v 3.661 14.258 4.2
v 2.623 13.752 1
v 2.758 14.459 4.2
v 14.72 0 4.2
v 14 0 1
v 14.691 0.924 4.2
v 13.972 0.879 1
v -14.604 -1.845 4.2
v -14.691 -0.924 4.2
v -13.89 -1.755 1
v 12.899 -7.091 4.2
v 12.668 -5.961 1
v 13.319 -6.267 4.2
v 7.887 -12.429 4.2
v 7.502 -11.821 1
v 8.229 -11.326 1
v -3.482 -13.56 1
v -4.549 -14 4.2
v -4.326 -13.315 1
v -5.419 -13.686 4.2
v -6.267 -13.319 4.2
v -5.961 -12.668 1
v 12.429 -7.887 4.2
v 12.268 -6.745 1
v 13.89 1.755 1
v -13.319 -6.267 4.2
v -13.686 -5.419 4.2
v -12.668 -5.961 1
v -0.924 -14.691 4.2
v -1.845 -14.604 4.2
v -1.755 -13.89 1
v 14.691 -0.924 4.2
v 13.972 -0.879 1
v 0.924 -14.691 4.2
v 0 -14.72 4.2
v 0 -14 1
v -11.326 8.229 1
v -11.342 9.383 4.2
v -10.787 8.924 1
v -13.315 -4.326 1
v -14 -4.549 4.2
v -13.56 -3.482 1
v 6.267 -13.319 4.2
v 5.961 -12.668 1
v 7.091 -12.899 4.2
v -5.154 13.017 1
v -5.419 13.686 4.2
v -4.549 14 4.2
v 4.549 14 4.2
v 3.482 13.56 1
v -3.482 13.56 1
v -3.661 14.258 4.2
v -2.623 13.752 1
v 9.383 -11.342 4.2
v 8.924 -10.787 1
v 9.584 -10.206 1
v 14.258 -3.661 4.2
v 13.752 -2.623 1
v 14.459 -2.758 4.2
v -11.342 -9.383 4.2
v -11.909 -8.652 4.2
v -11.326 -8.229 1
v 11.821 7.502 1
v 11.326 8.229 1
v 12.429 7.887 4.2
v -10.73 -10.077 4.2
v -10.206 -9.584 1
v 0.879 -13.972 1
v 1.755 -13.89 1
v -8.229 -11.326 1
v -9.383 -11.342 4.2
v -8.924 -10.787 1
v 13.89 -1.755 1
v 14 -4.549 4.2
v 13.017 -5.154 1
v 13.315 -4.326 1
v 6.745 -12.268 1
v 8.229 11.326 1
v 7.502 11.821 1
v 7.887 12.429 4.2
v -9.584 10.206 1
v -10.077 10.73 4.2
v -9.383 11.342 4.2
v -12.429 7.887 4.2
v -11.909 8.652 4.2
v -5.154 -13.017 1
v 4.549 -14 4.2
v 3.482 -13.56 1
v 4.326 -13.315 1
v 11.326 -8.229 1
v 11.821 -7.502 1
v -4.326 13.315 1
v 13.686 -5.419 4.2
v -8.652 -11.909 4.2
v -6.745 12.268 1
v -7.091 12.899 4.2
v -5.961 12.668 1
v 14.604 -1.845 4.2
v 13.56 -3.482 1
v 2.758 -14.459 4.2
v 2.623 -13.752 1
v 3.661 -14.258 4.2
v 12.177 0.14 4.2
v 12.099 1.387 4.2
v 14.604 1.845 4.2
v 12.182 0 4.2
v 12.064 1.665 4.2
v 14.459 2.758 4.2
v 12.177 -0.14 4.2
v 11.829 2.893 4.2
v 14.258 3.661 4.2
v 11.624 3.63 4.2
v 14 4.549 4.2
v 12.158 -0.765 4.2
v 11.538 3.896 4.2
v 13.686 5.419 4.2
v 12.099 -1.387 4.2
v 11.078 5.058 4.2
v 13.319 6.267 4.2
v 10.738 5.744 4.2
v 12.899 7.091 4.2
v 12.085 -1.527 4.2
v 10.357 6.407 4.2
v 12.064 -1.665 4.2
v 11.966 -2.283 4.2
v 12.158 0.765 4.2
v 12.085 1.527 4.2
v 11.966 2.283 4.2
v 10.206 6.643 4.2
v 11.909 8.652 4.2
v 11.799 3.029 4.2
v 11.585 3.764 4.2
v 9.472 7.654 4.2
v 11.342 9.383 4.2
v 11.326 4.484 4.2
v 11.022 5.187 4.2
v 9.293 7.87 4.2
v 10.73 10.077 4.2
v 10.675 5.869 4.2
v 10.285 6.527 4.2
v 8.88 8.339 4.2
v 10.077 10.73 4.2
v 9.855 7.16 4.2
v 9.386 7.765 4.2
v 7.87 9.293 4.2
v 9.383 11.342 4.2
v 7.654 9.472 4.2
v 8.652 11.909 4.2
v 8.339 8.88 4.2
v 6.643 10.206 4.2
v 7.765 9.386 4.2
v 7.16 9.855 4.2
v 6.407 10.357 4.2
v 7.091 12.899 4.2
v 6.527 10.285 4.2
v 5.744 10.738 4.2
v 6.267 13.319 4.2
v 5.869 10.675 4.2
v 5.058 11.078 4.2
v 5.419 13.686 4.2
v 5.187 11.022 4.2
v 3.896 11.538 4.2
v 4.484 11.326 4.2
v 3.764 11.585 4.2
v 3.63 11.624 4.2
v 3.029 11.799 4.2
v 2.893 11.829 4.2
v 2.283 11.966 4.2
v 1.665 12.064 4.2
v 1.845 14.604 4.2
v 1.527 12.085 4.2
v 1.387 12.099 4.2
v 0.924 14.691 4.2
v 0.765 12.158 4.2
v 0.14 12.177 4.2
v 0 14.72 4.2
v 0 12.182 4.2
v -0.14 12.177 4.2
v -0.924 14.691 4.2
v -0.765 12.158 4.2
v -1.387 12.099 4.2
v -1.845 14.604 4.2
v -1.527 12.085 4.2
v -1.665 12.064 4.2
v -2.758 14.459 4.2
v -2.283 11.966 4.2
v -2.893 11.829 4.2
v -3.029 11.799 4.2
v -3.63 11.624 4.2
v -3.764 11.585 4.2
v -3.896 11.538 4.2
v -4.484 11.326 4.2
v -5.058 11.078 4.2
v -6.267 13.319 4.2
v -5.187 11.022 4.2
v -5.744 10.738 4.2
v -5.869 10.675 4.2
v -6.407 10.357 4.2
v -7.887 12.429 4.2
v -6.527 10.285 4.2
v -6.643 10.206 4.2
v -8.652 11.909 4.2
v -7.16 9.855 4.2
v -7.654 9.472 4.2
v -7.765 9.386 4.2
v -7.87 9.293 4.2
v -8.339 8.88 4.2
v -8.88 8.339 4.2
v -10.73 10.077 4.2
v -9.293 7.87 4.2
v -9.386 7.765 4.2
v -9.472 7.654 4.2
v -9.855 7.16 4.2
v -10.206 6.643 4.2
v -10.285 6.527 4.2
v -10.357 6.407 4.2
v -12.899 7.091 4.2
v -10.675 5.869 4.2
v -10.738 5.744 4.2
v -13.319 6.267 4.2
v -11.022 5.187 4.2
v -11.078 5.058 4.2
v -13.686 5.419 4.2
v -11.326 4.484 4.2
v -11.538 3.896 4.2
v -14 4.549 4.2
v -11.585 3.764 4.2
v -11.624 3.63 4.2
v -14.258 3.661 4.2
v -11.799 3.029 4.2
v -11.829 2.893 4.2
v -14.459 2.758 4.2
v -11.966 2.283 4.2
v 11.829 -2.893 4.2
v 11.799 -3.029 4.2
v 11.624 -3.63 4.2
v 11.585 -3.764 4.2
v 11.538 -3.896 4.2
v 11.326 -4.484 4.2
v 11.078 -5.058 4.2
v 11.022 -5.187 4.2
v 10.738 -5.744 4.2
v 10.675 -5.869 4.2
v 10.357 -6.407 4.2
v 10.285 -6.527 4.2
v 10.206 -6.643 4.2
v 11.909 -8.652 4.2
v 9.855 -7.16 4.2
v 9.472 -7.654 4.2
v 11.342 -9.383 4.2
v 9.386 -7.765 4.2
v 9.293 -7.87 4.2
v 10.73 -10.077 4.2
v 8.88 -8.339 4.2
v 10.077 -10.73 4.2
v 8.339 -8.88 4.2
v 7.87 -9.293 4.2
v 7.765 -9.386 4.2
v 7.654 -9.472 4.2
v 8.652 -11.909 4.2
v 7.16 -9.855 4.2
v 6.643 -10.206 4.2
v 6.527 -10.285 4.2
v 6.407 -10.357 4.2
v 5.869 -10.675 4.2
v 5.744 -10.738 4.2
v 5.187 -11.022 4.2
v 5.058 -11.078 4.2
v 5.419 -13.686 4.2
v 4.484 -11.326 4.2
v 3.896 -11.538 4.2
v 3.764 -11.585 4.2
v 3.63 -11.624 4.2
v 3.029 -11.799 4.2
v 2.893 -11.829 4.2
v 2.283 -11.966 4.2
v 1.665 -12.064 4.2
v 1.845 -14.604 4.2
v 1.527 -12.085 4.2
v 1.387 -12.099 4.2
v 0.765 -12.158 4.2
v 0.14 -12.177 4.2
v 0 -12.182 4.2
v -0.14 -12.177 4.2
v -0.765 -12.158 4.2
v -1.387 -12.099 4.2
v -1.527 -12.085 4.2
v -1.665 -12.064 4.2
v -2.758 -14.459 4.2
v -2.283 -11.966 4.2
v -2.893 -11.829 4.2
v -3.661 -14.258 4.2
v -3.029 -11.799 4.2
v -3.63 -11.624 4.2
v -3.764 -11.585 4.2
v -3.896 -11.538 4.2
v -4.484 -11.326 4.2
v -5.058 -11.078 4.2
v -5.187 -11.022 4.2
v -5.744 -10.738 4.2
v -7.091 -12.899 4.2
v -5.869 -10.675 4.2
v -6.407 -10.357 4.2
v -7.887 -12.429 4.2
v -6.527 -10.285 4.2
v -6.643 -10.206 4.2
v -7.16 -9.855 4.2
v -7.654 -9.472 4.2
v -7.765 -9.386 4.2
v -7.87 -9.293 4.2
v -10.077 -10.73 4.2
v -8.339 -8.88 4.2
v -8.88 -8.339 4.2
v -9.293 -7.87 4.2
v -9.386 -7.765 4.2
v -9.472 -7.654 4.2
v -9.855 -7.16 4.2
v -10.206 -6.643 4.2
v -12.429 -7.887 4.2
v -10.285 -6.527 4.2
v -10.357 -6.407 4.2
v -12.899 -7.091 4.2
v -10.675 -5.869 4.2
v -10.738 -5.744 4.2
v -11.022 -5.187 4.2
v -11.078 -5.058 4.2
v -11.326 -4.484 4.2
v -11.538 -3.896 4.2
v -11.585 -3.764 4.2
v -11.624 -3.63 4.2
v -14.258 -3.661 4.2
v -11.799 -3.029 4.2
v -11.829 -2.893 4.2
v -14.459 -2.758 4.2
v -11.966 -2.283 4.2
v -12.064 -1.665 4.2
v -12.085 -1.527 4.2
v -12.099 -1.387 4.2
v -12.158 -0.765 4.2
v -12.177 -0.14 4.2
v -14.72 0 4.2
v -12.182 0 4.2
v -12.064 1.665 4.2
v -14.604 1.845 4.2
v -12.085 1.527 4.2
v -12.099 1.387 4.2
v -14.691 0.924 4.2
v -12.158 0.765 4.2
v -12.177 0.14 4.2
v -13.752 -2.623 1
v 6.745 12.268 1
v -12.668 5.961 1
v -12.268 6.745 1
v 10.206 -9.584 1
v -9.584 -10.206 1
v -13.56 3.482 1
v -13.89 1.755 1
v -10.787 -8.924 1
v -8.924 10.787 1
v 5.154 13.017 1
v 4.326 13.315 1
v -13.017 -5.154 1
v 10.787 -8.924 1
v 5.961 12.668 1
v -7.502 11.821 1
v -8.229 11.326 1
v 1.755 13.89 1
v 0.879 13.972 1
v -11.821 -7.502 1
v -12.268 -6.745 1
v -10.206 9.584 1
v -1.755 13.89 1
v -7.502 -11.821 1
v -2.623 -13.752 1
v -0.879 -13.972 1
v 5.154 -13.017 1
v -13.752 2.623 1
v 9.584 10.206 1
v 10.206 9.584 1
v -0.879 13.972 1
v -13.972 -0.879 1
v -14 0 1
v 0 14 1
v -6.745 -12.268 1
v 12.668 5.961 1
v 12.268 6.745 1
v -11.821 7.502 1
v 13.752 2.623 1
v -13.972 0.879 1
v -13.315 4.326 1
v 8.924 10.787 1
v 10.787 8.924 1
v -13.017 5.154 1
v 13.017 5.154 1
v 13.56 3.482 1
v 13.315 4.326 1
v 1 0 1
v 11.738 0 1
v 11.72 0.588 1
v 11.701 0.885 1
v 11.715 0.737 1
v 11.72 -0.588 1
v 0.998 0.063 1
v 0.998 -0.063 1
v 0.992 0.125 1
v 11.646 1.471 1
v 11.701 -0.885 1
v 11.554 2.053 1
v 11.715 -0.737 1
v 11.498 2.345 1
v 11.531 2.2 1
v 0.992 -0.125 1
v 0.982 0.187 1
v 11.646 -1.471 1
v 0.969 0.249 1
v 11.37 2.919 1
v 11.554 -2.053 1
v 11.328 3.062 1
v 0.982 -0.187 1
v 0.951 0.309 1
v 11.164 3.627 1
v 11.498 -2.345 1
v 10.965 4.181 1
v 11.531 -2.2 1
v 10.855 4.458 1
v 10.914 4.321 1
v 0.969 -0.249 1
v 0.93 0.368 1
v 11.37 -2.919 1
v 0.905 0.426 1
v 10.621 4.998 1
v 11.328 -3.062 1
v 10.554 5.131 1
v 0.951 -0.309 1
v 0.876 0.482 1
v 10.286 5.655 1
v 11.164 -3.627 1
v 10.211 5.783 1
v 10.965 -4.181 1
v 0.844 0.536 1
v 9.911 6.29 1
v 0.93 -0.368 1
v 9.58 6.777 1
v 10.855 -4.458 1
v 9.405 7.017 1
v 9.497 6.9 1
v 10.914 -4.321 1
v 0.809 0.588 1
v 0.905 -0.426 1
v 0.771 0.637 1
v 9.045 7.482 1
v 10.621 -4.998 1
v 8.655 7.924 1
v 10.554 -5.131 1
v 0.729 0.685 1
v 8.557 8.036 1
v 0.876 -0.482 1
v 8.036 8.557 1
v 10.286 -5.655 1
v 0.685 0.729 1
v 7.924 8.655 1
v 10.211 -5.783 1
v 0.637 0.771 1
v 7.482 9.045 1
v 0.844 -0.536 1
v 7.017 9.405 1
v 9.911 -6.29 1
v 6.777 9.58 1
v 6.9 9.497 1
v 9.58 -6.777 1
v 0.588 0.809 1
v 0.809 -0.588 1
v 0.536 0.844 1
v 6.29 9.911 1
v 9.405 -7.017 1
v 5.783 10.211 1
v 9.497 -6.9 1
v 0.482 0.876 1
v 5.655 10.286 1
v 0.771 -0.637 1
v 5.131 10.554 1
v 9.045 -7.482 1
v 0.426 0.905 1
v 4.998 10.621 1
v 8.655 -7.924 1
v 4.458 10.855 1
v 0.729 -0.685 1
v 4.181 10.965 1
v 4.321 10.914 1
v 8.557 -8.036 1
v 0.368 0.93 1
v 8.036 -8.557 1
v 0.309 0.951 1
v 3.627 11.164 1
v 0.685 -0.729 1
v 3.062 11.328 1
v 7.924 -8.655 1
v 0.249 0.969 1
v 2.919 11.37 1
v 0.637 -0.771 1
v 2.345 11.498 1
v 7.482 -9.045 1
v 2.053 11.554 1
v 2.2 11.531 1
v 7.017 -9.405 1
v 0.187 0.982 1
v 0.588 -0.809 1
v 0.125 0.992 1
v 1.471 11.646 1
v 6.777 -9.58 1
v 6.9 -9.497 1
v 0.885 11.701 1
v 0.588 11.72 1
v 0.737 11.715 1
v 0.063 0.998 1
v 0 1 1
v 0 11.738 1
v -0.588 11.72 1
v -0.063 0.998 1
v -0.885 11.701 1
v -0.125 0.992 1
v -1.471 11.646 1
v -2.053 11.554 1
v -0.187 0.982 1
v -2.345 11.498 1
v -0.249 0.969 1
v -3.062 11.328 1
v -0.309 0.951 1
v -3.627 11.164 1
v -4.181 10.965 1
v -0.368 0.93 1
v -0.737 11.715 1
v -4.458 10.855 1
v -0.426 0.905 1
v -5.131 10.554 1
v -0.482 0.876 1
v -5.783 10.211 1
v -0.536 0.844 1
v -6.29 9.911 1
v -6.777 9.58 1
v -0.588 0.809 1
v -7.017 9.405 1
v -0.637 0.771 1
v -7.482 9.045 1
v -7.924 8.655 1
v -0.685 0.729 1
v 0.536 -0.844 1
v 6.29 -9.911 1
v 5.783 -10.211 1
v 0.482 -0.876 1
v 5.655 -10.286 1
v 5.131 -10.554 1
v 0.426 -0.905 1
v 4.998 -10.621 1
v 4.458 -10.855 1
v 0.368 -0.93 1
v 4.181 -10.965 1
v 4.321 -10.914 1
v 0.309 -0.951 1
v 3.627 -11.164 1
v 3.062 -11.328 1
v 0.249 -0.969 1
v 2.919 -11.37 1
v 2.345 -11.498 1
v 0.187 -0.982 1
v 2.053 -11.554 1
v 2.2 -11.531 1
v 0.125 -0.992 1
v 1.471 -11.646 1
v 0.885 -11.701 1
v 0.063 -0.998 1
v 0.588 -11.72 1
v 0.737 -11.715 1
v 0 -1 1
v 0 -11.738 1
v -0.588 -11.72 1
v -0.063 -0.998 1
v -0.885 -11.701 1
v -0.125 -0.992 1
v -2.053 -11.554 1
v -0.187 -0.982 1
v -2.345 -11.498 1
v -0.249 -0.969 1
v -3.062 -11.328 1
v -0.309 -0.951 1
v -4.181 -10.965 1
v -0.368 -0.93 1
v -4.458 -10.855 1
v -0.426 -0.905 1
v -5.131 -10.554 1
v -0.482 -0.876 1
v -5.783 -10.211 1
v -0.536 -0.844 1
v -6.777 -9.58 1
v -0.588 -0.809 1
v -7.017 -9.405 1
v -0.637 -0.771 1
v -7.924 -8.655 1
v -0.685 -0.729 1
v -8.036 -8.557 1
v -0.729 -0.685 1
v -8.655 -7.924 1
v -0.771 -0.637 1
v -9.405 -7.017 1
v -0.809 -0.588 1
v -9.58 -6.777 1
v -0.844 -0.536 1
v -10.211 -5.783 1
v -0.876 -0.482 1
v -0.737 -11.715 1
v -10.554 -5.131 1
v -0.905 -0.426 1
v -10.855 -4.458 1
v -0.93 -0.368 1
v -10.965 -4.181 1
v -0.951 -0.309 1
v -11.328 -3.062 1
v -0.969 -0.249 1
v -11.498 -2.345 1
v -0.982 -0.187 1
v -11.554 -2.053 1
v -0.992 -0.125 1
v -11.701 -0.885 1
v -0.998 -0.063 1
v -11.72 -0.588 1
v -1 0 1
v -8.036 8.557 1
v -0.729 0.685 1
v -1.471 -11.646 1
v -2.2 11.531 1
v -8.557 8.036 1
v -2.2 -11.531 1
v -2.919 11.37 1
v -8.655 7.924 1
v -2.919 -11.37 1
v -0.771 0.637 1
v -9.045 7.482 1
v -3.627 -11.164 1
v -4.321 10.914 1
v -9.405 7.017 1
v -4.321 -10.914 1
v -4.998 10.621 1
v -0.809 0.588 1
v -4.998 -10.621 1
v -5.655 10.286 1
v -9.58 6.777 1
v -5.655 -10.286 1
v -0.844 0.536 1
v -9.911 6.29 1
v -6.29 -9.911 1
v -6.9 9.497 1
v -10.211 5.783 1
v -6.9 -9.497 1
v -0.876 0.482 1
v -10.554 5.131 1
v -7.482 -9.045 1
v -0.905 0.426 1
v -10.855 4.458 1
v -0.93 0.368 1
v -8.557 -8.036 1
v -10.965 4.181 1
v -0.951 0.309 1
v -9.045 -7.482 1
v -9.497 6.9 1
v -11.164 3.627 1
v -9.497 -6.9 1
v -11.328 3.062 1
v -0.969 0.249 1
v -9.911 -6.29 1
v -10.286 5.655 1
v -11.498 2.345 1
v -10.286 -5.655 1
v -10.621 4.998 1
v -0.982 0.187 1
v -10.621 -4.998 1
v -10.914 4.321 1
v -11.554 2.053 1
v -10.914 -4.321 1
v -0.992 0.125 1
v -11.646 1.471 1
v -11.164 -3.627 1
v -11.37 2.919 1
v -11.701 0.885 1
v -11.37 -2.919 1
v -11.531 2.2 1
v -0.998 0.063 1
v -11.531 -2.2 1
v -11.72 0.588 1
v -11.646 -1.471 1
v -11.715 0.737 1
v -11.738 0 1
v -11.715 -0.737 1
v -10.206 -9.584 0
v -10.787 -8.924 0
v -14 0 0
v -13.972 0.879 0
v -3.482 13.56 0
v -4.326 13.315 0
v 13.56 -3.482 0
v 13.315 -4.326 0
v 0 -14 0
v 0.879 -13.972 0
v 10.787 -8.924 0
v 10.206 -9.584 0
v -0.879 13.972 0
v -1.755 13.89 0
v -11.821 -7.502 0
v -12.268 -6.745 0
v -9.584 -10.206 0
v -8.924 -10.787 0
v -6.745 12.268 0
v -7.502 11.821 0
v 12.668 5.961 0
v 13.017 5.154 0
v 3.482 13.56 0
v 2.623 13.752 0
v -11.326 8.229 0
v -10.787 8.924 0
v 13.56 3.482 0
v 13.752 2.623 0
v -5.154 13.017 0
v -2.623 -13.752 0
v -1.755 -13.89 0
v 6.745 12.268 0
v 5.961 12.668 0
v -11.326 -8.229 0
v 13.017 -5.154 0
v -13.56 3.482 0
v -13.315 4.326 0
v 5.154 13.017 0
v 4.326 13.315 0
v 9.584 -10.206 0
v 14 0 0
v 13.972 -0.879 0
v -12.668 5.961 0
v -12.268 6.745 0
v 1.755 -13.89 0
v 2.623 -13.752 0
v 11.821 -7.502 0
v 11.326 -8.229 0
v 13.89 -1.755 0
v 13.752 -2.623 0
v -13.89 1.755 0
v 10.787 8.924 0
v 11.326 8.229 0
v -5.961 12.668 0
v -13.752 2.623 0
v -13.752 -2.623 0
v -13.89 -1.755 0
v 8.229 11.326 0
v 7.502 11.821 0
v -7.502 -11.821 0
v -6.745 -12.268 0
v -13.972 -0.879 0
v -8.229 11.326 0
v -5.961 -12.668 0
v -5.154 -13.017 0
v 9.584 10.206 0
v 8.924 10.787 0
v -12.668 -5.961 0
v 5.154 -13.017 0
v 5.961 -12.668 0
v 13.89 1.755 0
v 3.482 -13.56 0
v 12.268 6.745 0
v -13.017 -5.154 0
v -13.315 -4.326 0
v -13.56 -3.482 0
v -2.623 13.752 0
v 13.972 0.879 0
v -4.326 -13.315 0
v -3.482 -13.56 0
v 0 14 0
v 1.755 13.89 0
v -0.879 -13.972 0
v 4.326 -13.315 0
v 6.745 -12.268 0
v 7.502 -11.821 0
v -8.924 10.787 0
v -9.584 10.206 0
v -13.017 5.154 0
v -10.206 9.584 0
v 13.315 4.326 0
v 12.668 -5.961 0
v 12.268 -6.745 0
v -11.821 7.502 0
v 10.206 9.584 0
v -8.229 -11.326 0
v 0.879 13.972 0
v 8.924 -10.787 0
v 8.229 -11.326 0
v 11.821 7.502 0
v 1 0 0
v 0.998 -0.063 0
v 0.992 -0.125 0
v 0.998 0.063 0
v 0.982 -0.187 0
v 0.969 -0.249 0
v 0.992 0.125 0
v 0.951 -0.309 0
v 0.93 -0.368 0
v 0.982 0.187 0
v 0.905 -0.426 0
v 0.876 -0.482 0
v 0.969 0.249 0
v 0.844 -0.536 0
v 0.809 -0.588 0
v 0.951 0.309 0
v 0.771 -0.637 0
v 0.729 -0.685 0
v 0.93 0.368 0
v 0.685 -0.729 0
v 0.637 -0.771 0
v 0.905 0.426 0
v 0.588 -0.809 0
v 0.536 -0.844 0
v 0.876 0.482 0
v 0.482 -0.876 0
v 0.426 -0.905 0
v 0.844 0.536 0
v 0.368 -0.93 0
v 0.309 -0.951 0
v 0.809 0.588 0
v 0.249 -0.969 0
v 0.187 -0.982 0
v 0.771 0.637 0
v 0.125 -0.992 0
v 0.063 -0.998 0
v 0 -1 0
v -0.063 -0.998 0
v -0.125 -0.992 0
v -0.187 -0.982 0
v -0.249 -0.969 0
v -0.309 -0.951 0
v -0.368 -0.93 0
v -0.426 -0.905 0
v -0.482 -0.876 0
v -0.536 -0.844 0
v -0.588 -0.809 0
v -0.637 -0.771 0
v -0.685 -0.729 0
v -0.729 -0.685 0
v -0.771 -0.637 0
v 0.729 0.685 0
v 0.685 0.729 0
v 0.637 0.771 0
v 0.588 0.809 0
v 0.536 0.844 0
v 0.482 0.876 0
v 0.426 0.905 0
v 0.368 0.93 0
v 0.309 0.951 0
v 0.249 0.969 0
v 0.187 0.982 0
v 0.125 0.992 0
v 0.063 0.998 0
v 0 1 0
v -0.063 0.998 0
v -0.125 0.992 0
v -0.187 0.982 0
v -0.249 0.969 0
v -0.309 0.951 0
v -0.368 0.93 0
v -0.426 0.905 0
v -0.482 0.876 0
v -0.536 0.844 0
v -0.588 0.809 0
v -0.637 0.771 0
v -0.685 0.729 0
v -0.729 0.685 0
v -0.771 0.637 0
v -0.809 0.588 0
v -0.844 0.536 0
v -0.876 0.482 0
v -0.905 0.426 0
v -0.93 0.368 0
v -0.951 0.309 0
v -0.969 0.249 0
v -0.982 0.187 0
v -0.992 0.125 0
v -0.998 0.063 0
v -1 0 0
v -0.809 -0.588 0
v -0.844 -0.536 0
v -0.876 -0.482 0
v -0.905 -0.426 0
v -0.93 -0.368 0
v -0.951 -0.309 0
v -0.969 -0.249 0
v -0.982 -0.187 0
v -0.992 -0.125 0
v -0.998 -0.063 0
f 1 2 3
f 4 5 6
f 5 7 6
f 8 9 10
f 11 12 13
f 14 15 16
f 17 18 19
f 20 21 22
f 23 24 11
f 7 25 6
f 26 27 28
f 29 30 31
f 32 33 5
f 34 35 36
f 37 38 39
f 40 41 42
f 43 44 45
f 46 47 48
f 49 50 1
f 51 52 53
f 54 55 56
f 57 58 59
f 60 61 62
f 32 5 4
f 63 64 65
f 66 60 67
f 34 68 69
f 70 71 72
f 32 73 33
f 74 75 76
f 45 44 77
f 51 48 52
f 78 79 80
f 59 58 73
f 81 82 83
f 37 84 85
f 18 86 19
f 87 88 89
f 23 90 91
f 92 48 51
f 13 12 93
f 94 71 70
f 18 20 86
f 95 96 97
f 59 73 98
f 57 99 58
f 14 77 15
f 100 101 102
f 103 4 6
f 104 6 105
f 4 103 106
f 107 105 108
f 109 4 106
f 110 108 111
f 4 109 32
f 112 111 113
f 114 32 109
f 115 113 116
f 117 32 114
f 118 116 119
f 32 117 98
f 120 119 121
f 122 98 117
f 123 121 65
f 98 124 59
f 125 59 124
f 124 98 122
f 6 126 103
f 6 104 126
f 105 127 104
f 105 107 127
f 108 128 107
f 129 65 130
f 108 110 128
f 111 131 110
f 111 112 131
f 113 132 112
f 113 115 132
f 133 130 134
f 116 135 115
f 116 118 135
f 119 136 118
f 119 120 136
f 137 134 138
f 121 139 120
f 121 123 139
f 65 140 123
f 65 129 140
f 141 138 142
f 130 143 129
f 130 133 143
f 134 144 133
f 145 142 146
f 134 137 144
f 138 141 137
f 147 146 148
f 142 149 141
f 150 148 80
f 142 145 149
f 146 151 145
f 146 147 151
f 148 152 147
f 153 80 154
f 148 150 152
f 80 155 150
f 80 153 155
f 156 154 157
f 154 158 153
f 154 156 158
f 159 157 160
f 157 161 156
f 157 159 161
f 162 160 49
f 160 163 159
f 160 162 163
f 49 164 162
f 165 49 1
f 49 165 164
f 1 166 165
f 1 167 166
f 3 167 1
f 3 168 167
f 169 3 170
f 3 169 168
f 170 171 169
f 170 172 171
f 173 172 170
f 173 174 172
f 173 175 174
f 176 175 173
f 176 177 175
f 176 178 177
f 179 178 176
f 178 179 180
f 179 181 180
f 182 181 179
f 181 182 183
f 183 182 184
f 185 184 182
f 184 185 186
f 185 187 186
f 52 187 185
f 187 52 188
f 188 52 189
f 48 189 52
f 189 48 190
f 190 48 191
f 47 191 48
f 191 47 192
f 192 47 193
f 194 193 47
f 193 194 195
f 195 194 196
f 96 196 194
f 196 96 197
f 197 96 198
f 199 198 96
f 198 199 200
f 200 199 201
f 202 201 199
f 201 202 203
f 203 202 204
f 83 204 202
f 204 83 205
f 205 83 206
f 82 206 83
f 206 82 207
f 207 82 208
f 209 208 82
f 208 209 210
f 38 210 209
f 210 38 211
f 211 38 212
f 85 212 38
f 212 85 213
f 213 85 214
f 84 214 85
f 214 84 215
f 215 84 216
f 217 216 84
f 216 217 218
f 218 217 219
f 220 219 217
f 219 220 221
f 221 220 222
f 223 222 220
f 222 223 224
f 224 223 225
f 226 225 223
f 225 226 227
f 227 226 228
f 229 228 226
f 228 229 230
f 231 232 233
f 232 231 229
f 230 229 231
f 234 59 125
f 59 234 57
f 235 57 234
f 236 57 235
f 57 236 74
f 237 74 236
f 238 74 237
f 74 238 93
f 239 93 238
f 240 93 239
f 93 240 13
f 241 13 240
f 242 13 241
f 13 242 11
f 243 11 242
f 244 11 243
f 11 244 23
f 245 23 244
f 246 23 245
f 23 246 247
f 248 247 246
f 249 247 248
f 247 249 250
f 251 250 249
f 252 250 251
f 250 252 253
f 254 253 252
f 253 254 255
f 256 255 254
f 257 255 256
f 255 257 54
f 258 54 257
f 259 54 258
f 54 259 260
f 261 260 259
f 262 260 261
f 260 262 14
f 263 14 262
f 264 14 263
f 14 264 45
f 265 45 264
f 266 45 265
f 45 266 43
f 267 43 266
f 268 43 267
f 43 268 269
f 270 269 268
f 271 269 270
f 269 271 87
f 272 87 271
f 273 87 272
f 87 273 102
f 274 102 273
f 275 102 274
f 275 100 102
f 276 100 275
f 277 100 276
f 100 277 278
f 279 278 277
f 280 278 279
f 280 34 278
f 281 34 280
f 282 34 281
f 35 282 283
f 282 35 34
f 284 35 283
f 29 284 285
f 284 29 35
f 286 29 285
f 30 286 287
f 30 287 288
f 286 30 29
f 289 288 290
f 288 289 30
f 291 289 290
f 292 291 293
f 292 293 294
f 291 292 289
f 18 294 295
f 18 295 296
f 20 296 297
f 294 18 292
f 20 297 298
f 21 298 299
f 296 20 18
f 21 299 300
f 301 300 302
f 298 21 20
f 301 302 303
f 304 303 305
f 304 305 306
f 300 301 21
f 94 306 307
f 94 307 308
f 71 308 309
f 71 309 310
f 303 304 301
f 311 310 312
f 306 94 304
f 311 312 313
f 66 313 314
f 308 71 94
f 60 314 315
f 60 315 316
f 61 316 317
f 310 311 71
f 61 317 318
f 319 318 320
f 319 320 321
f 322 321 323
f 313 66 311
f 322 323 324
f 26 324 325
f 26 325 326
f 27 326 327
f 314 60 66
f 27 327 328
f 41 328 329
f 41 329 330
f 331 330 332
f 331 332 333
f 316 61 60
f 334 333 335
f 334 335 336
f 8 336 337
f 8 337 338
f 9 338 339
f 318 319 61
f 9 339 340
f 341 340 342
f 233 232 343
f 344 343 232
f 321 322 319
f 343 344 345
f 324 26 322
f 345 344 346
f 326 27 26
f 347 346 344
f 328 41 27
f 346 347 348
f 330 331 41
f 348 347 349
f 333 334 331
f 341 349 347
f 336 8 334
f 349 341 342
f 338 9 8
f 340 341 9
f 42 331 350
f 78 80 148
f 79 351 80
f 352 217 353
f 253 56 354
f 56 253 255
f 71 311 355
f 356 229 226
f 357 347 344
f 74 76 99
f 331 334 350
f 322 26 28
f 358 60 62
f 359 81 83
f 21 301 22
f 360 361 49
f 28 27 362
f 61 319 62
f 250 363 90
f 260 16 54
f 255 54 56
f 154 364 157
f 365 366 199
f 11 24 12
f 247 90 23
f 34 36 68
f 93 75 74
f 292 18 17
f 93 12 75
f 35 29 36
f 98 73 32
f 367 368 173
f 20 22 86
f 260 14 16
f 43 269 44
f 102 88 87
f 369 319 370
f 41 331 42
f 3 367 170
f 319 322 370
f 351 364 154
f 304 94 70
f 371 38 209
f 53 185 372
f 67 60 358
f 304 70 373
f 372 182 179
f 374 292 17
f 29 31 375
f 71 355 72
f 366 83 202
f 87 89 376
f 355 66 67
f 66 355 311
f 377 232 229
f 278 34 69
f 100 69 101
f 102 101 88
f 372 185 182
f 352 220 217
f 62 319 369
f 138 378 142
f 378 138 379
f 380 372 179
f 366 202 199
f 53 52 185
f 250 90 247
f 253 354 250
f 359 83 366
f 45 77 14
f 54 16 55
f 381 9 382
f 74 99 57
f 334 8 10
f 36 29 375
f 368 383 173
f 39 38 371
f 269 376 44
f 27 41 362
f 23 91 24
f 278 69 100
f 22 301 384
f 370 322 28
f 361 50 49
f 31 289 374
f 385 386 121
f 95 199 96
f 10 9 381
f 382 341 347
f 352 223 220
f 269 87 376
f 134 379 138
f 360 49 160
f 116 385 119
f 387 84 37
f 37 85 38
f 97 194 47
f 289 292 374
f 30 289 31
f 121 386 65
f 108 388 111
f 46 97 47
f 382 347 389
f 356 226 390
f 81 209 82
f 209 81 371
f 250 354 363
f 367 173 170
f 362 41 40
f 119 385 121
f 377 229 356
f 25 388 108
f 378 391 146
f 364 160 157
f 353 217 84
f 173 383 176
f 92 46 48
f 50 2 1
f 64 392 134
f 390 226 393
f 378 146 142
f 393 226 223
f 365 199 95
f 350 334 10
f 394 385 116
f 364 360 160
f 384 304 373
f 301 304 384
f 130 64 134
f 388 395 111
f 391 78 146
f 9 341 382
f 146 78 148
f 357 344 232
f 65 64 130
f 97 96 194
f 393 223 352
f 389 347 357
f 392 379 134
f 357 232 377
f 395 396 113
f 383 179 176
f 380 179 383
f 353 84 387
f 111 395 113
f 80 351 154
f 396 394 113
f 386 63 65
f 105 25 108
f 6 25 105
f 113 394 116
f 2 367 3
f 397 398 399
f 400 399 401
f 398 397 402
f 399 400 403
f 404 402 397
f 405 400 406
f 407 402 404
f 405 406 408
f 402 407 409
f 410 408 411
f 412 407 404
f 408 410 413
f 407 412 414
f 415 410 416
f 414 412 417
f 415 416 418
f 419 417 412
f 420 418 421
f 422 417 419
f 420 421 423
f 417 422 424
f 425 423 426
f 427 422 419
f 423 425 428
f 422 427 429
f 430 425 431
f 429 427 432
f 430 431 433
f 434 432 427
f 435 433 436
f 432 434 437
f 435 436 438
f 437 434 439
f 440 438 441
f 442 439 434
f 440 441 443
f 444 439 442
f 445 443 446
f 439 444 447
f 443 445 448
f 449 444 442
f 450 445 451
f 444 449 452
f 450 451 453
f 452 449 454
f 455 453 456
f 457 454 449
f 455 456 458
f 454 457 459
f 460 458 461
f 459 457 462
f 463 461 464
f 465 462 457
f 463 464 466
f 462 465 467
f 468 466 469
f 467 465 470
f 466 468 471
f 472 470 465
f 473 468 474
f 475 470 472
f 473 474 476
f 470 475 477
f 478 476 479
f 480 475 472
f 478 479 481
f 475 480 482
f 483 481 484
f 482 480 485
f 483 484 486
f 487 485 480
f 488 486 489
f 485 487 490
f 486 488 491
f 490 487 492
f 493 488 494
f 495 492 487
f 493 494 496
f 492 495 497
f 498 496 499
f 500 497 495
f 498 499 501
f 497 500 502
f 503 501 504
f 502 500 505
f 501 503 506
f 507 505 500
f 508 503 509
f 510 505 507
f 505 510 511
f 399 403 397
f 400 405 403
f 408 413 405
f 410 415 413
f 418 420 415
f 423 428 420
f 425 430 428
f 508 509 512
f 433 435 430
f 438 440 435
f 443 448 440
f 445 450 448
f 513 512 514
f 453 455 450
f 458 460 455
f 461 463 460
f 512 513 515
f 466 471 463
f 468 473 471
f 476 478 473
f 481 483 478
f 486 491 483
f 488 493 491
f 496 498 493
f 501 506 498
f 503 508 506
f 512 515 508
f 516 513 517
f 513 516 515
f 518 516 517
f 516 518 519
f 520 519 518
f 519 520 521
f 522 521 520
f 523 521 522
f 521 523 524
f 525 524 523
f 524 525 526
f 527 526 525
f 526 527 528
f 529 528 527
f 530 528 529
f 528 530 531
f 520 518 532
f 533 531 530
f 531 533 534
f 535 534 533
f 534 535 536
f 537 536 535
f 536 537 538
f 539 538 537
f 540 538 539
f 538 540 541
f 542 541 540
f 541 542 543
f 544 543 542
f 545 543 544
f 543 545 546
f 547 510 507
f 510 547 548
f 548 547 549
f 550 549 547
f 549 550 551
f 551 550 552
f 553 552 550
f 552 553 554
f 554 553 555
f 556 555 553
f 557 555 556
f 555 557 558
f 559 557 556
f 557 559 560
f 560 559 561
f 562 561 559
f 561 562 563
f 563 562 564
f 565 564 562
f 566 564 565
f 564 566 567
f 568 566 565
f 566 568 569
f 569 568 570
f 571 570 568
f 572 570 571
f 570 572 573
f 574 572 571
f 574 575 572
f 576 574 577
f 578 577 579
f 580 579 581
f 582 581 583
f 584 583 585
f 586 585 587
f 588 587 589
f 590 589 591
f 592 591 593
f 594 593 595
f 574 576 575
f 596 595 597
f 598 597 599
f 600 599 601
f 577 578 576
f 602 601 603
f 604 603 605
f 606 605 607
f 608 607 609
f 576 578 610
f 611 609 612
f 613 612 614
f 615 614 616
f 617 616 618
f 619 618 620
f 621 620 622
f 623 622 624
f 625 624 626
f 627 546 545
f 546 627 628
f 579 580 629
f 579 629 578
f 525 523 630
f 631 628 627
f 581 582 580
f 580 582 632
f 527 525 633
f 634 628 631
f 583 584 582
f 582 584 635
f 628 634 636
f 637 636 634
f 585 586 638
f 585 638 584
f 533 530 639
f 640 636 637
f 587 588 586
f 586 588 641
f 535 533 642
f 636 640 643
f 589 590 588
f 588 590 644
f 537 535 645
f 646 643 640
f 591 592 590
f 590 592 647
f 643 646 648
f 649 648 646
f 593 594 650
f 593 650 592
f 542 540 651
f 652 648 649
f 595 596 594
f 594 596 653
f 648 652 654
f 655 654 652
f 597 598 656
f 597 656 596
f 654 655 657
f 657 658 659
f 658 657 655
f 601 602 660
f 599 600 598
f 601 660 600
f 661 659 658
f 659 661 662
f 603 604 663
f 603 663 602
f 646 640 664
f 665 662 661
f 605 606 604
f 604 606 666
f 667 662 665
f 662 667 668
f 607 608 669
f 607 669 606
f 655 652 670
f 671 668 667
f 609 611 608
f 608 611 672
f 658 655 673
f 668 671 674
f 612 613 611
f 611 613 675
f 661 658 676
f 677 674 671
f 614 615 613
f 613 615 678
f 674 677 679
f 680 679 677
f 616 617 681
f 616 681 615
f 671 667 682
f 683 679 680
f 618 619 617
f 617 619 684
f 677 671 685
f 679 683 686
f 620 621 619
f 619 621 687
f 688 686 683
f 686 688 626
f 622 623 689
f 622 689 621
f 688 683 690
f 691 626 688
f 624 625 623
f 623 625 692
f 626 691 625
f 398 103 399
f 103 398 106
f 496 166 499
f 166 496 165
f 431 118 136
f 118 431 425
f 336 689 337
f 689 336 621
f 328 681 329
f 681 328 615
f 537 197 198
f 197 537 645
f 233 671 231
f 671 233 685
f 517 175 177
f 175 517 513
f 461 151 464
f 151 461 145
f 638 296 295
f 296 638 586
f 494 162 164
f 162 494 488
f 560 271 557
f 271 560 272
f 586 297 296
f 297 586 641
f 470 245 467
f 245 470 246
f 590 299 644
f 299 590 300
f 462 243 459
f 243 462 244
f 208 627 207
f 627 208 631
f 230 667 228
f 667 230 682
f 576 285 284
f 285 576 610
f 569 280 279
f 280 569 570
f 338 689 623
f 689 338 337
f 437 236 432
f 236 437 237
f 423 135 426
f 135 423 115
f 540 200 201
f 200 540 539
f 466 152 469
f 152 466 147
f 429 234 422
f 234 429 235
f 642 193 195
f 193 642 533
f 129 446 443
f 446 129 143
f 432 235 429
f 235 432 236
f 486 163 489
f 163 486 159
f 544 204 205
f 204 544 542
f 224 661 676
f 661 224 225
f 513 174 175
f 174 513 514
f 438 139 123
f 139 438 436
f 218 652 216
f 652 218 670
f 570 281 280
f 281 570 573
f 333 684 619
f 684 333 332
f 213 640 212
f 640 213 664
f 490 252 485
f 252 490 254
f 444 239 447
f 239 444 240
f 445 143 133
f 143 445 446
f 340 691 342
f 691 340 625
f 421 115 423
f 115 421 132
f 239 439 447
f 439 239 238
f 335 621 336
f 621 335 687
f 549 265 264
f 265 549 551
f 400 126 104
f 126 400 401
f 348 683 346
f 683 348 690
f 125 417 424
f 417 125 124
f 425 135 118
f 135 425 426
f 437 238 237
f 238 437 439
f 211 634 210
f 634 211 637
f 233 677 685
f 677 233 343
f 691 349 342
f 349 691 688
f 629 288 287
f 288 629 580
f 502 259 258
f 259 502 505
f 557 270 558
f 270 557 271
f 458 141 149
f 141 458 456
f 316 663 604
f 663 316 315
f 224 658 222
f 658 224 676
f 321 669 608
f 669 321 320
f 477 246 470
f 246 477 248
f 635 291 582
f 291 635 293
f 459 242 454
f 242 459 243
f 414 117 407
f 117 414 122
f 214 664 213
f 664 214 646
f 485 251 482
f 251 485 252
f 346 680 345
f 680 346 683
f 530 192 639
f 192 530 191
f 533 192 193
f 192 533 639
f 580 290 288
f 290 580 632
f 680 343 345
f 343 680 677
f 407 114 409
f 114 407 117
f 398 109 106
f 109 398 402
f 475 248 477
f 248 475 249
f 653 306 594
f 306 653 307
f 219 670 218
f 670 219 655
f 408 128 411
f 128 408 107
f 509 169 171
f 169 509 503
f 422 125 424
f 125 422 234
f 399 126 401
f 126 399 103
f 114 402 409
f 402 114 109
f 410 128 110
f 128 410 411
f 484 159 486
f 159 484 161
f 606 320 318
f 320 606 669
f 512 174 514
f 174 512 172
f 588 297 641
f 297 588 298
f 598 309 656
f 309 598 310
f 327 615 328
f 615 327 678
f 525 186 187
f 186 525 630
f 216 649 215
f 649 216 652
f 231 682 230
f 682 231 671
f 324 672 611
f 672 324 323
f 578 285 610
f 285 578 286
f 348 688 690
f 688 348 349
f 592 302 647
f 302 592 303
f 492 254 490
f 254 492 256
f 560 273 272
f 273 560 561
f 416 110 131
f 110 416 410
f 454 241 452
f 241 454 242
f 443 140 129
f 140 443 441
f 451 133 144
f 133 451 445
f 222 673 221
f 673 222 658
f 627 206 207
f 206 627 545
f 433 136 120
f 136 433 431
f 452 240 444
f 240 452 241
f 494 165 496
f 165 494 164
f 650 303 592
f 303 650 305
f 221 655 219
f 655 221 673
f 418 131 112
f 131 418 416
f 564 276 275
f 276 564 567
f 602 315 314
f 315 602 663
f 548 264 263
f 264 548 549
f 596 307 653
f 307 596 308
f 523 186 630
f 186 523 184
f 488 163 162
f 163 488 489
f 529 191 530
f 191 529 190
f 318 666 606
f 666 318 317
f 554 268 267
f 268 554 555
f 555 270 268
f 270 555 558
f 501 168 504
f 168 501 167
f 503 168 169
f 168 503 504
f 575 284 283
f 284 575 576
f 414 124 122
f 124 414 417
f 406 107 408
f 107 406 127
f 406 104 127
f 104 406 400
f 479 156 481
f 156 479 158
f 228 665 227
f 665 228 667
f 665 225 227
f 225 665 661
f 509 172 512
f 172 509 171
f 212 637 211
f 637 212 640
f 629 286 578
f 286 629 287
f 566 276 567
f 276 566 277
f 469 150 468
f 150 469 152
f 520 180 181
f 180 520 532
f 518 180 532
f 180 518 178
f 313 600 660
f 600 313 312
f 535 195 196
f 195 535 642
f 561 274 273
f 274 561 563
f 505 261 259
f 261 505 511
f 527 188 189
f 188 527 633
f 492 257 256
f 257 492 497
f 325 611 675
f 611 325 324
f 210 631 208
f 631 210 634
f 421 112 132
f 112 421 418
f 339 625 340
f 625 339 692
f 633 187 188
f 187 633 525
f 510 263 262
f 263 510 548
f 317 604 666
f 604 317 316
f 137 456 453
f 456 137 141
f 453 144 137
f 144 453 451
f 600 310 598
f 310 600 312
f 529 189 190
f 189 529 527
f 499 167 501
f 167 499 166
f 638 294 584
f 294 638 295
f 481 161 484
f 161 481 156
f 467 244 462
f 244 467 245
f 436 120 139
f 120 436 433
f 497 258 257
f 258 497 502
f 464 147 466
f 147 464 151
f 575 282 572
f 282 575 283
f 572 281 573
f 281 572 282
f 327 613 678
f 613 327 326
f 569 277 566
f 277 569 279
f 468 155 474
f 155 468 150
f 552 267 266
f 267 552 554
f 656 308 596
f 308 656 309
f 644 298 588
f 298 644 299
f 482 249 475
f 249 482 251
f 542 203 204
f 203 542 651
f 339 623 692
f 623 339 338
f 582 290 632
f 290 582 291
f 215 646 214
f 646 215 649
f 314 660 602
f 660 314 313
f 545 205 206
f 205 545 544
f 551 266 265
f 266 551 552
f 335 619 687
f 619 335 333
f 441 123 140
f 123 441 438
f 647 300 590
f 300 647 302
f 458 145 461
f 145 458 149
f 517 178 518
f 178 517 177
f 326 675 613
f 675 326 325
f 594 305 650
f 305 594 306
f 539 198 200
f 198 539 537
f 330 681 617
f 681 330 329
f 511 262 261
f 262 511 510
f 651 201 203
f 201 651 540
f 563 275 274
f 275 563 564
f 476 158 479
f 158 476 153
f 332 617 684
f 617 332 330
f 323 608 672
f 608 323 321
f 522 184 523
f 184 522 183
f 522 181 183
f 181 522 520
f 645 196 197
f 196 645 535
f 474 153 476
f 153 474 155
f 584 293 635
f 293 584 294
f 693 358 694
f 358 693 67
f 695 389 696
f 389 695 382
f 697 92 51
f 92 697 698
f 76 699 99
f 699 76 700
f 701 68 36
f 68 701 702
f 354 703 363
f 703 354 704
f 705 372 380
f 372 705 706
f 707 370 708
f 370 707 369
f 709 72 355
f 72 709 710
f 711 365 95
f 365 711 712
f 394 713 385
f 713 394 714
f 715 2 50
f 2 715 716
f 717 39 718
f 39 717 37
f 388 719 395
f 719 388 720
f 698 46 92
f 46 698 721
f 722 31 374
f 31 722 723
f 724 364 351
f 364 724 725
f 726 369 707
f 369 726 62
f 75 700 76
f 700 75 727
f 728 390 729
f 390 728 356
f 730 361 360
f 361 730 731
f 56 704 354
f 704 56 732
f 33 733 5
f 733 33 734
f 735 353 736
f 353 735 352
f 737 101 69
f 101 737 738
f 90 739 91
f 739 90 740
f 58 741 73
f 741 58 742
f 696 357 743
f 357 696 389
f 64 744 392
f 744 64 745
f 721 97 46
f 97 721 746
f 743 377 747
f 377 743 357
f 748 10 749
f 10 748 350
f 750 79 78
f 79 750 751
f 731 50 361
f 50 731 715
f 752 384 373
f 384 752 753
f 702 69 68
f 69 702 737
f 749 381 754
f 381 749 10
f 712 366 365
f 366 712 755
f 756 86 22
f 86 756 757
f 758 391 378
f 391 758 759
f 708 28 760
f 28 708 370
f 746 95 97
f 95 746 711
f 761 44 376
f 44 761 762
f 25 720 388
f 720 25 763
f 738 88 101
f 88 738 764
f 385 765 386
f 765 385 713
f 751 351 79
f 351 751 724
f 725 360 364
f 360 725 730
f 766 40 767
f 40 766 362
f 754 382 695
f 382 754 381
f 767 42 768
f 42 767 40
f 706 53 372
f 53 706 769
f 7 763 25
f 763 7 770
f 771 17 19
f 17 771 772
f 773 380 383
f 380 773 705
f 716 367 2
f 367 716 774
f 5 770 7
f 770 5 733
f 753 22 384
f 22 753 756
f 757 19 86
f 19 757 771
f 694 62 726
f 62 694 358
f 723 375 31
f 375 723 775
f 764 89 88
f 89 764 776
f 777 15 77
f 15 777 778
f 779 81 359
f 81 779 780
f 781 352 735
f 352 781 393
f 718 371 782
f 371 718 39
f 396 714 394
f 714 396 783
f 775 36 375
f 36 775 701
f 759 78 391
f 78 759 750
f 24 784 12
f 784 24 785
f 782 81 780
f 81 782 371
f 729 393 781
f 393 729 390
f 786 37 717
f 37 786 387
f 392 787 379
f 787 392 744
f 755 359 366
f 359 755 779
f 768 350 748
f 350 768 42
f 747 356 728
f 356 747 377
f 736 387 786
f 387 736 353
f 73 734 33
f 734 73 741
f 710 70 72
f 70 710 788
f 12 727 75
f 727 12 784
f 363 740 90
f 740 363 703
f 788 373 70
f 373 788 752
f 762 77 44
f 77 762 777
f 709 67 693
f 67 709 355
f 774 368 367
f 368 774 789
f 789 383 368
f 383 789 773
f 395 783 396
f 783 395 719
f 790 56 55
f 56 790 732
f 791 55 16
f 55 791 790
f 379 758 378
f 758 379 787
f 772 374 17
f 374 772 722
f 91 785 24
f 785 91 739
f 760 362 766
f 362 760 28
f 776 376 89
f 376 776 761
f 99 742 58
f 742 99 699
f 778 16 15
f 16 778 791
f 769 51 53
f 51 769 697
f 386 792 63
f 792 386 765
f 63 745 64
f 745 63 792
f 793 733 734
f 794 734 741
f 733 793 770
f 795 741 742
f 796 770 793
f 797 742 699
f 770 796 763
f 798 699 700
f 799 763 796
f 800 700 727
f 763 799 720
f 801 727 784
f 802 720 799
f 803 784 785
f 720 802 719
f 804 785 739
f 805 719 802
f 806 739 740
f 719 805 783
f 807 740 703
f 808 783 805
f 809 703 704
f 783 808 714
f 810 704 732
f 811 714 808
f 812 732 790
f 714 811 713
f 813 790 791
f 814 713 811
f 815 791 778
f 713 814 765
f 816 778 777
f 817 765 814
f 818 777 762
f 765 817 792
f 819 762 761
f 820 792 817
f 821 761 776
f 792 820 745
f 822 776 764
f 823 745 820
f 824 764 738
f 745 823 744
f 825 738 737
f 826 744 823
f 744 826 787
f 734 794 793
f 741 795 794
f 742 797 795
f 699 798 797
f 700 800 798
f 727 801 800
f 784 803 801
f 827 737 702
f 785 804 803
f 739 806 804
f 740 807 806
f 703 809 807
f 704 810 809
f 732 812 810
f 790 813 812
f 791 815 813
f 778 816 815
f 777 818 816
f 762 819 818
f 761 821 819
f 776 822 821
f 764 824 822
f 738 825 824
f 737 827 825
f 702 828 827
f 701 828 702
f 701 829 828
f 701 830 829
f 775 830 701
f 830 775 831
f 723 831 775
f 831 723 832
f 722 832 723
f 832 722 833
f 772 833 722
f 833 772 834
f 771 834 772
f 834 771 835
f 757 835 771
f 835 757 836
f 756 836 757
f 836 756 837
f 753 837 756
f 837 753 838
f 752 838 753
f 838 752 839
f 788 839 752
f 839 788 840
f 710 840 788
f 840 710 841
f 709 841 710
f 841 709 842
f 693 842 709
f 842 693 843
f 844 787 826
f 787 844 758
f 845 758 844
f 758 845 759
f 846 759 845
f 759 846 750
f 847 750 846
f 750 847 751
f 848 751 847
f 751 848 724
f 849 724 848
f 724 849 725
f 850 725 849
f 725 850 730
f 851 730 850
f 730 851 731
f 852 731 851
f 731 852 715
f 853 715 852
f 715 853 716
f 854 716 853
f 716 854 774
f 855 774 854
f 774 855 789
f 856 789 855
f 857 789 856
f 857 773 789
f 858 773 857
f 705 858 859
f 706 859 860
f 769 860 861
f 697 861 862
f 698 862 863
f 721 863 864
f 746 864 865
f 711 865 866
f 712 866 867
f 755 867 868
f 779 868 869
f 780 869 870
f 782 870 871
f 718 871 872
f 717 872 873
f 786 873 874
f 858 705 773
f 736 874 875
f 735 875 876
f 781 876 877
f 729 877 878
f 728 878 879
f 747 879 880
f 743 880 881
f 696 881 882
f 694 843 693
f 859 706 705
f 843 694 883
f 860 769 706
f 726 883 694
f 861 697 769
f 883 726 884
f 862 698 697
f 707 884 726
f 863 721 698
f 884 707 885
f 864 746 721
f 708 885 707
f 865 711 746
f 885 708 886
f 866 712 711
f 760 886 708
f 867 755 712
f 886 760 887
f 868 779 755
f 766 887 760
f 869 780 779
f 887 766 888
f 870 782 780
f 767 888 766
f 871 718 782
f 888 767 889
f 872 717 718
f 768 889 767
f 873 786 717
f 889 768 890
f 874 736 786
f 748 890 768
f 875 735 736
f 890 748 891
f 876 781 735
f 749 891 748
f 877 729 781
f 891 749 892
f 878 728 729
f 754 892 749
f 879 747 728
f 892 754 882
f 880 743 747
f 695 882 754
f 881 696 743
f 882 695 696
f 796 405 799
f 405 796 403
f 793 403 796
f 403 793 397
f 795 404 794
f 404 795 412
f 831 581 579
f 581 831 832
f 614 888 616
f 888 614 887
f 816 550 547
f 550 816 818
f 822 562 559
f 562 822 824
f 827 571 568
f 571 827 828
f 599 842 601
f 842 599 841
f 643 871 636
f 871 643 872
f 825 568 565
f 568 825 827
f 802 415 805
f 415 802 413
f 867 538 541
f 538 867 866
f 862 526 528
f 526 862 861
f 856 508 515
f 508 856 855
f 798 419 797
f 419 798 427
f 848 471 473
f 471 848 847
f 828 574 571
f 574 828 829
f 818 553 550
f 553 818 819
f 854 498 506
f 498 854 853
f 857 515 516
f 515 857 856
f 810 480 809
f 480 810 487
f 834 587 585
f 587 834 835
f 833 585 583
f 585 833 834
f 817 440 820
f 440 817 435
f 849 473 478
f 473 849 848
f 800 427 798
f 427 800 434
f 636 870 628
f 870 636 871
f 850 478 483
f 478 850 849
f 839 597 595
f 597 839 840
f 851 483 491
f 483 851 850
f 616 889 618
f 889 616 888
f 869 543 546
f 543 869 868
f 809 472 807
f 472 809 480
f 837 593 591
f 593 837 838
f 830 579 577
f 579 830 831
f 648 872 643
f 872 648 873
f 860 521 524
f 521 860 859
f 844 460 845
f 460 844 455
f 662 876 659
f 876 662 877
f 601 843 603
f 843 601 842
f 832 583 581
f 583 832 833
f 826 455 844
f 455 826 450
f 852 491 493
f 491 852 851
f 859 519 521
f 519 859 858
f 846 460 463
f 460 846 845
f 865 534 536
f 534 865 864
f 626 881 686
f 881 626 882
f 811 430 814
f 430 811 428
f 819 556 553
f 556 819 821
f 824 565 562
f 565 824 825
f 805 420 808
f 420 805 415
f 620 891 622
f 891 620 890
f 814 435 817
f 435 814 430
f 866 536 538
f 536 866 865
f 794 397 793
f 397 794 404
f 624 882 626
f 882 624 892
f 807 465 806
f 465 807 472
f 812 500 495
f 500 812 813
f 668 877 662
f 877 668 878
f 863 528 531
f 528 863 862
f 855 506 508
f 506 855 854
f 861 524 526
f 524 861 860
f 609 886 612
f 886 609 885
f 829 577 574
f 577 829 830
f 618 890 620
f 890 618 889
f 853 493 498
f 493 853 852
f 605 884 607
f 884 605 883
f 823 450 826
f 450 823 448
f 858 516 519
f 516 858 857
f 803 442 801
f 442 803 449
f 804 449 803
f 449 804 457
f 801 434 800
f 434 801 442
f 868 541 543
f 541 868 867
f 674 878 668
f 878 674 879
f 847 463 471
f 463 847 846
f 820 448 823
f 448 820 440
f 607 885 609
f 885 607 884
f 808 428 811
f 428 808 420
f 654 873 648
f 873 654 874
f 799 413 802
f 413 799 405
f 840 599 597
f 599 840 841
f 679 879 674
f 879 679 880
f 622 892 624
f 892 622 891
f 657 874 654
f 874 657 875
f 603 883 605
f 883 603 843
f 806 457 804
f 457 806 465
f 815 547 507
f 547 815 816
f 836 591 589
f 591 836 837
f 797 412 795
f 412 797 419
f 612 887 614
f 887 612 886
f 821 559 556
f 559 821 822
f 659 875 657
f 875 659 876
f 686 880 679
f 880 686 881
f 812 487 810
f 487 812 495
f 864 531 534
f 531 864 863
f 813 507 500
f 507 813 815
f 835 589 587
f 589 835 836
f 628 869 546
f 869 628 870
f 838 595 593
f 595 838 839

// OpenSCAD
// The height (in millimeters) of the leveling foot's base
base_height = 1.0; // [0.5:0.1:50]

/* [Hidden] */
faces = 100;

difference(){
    union(){ 
        translate([0,0,base_height]){
            // cone
            difference(){
                cylinder(h=3.2, r1=14, r2=14.72, $fn=faces);
                // extra height as the "cutter" must extend beyond
                // what it cuts through. It also solves rendering
                // issues on Thingispace.
                translate([0,0,-1]){
                    cylinder(h=3.2+2, r1=11.6, r2=12.32, $fn=faces);
                }
            }
            
            // bottom circle
            rotate([0,180,0]){
                cylinder(h=base_height, r=14, $fn=faces);
            };
        }
    }

    // center hole - must extend beyond what it cuts through
    translate([0,0,-1]){
        cylinder(h=base_height+2, r=1, $fn=faces);
    }
}
